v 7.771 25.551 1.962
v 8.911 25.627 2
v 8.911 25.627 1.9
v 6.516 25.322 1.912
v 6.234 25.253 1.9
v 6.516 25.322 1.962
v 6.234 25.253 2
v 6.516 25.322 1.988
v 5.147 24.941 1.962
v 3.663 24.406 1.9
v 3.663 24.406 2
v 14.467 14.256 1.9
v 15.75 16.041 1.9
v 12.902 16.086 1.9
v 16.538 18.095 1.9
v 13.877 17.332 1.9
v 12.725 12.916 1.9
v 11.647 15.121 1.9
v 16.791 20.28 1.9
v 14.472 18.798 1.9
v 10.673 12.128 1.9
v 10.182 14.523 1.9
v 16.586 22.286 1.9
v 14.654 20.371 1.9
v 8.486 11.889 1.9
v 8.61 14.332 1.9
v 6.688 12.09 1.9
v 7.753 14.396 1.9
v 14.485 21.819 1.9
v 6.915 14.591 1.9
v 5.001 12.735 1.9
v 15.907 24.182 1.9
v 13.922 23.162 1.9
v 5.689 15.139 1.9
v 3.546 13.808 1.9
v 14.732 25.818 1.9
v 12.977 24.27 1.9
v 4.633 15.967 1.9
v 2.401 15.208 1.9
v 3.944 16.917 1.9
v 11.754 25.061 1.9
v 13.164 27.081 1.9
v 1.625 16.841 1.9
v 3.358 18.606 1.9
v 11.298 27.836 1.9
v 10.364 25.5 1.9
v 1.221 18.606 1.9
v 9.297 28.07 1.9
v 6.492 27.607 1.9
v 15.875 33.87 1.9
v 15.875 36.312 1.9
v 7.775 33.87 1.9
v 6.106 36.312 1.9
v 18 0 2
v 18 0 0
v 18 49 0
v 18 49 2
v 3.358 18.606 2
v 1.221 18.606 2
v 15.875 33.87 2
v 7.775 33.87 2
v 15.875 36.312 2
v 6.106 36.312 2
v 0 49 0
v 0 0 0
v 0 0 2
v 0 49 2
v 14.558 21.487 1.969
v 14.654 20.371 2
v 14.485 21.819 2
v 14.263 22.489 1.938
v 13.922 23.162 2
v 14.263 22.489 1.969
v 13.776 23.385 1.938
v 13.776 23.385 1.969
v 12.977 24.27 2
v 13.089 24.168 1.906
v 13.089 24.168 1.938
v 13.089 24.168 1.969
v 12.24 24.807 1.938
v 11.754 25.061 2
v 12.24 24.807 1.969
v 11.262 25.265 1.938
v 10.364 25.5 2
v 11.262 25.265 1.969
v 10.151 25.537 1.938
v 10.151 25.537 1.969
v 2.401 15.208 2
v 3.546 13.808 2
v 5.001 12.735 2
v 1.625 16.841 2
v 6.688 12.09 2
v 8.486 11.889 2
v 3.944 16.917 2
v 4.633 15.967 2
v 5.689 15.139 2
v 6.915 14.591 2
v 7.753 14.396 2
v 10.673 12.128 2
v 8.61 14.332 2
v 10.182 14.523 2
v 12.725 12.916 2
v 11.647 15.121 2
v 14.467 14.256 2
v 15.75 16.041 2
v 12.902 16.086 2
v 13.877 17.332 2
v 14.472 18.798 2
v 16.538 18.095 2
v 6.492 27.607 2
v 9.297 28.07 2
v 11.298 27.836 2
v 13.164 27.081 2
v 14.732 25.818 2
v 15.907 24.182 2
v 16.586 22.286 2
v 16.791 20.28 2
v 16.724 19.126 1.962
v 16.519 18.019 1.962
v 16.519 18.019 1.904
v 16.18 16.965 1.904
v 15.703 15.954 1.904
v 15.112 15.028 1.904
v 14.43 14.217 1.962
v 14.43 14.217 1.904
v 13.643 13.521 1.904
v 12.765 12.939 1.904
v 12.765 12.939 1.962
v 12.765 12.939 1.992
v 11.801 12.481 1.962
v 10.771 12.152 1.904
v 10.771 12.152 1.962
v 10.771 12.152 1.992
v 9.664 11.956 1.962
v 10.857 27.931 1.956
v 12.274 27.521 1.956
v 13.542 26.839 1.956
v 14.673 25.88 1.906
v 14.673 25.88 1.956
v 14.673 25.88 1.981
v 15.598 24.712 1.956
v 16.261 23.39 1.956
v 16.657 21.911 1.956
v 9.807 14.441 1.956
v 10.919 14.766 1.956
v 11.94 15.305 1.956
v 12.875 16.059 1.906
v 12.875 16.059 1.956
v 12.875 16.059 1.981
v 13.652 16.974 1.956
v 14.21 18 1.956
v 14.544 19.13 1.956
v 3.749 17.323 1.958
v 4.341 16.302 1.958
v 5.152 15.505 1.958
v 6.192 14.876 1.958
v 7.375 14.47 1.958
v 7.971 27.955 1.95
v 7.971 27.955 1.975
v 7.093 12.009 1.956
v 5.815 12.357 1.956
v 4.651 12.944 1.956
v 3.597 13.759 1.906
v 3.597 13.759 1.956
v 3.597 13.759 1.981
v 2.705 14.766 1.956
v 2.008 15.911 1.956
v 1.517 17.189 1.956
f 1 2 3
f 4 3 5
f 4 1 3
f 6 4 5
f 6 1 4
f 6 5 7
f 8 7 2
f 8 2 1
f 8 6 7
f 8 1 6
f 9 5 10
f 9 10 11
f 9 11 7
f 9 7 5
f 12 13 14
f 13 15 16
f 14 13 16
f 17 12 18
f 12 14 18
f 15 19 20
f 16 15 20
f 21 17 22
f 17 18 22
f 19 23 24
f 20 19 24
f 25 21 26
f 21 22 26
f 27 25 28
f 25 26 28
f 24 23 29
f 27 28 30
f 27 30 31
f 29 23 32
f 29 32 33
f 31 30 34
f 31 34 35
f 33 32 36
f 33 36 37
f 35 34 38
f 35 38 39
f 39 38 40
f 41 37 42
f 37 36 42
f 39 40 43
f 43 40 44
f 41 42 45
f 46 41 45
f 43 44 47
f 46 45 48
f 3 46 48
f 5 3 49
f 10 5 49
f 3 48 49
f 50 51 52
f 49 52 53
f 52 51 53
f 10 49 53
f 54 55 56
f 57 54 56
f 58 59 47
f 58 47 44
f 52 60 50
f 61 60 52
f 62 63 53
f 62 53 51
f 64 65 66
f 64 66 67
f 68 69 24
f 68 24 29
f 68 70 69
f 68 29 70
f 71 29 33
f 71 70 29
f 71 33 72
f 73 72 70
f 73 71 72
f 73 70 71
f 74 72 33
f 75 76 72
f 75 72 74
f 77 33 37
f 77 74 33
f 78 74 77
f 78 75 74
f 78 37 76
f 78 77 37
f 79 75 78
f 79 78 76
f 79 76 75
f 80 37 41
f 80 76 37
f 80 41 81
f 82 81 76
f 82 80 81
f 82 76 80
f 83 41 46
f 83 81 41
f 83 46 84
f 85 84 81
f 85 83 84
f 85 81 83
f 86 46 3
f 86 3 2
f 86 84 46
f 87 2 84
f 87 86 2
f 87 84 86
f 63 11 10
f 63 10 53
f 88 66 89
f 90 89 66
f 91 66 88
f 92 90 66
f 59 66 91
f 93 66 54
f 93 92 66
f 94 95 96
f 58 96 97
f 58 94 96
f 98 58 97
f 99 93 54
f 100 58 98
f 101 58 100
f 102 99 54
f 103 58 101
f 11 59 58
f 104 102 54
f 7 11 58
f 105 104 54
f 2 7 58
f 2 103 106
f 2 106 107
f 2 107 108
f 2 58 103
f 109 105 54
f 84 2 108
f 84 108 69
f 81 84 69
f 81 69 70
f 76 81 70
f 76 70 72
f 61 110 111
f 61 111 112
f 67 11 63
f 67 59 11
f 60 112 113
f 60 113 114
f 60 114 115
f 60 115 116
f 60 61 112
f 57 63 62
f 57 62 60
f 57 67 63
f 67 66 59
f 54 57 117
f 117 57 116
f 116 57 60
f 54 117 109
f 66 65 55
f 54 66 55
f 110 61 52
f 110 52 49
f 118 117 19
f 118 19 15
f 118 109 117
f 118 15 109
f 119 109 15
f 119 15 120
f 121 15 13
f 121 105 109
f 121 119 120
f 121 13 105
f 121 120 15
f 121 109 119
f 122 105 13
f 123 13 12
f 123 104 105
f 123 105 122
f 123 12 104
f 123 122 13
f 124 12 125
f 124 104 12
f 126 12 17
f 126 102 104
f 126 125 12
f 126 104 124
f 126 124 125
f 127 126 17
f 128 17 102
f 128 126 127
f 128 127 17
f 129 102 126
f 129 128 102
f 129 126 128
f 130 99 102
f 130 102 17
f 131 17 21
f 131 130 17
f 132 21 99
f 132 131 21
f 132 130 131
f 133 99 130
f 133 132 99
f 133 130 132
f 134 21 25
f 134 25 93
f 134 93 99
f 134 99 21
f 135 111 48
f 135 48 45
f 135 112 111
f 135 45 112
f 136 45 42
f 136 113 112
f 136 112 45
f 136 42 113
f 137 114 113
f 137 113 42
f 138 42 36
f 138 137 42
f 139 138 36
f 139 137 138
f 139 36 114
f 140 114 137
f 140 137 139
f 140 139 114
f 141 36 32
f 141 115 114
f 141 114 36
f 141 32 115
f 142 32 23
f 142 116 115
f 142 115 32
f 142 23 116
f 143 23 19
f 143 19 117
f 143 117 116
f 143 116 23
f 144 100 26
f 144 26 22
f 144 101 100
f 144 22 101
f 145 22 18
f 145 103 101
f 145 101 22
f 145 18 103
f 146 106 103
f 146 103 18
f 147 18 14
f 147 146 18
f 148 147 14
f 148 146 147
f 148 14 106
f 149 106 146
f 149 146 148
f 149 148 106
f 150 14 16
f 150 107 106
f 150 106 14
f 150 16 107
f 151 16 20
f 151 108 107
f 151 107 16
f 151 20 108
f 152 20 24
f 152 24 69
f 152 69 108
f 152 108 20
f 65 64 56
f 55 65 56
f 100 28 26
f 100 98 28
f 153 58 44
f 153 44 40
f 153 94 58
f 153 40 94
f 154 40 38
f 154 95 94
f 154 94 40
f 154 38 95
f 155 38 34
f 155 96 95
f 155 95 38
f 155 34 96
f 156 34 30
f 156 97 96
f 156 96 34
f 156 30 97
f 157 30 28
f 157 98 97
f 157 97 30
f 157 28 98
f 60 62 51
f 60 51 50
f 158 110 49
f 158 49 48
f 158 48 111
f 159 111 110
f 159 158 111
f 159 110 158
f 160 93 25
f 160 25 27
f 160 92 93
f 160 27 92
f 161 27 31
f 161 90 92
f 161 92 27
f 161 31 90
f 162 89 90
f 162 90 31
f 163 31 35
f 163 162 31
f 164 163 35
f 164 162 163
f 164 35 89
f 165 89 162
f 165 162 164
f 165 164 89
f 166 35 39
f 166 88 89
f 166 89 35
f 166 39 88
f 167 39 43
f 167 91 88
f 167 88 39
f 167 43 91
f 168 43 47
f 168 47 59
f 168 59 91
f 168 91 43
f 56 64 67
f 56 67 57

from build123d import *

# Parameters (mm, degrees)
SKETCH_1_W          = 18
SKETCH_1_H          = 49
EXTRUDE_1_DEPTH     = 2
CUT_EXTRUDE_1_DEPTH = 0.1


with BuildPart() as part:
    # ｽｹｯﾁ1 → ﾎﾞｽ - 押し出し1 (new body)
    with BuildSketch(Plane.XY):
        with Locations((9, 24.5)):
            Rectangle(SKETCH_1_W, SKETCH_1_H)
    extrude(amount=EXTRUDE_1_DEPTH)

    # ｽｹｯﾁ2 → ｶｯﾄ - 押し出し1 (cut)
    with BuildSketch(Plane.XY.offset(2)):
        with BuildLine():
            Line((15.875, 36.3125), (15.875, 33.870192308))
            Line((15.875, 33.870192308), (7.775315505, 33.870192308))
            Line((7.775315505, 33.870192308), (6.49214994, 27.607008714))
            add(Edge.make_bspline(
                [(6.49214994, 27.607008714), (6.744262228, 27.676611099), (7.232689912, 27.811454712), (7.953595395, 27.961172542), (8.637981636, 28.051424939), (9.082087281, 28.063748319), (9.29698768, 28.069711538)],
                knots=[0, 0, 0, 0, 1.100273476, 2.13160584, 3.095893838, 4, 4, 4, 4], degree=3))
            add(Edge.make_bspline(
                [(9.29698768, 28.069711538), (9.562896695, 28.063956155), (10.085740255, 28.052639632), (10.850726663, 27.943974013), (11.580973668, 27.772932808), (12.27495408, 27.53398783), (12.933951755, 27.228441252), (13.551903557, 26.846761301), (14.138085072, 26.400900602), (14.68198022, 25.888285431), (15.175404531, 25.324122288), (15.609240996, 24.717530344), (15.977740048, 24.074404643), (16.274108756, 23.388600502), (16.510766458, 22.667699833), (16.668282709, 21.904117441), (16.77317139, 21.105050767), (16.784889768, 20.558692889), (16.790865385, 20.280085637)],
                knots=[0, 0, 0, 0, 1.052922333, 2.070308379, 3.05430497, 4.020497103, 4.973039431, 5.925935799, 6.892292201, 7.88610001, 8.88166317, 9.857072816, 10.836096531, 11.812156883, 12.81219415, 13.836441305, 14.89672472, 16, 16, 16, 16], degree=3))
            add(Edge.make_bspline(
                [(16.790865385, 20.280085637), (16.786340497, 20.086032674), (16.777351873, 19.700549205), (16.731641482, 19.128068125), (16.643632414, 18.567706707), (16.525469862, 18.019390612), (16.372100912, 17.48415792), (16.186437884, 16.960476631), (15.959225626, 16.451606182), (15.710001448, 15.952731619), (15.429378088, 15.475131061), (15.117920743, 15.028483492), (14.788862669, 14.606088649), (14.434795386, 14.212476644), (14.052427901, 13.850233968), (13.646390984, 13.517210839), (13.219924628, 13.20777536), (12.766430926, 12.934488174), (12.296015104, 12.683008062), (11.801883841, 12.47669971), (11.295285147, 12.292251296), (10.76892769, 12.145229331), (10.224003714, 12.030027487), (9.659614974, 11.951782329), (9.078721487, 11.894792638), (8.684964705, 11.891225138), (8.486065204, 11.889423077)],
                knots=[0, 0, 0, 0, 1.056347294, 2.098418968, 3.122841568, 4.141288669, 5.149314143, 6.15115421, 7.162517403, 8.180376062, 9.185164535, 10.17417709, 11.141909838, 12.097768115, 13.052685741, 14.0056014, 14.954263652, 15.917497458, 16.885230207, 17.854509472, 18.828990115, 19.81800267, 20.826176721, 21.857883937, 22.917946725, 24, 24, 24, 24], degree=3))
            add(Edge.make_bspline(
                [(8.486065204, 11.889423077), (8.248796225, 11.894123242), (7.781997537, 11.903370263), (7.098098679, 12.000106743), (6.440093951, 12.138654103), (5.813280227, 12.347090153), (5.212040023, 12.608260854), (4.644467603, 12.938344093), (4.096060448, 13.312398352), (3.589112484, 13.753816468), (3.118603926, 14.236296376), (2.697418571, 14.759883184), (2.322313344, 15.315935282), (1.999295101, 15.90715308), (1.72376392, 16.531983085), (1.507308375, 17.192766359), (1.332603853, 17.886050314), (1.258693796, 18.363344733), (1.221153846, 18.605769231)],
                knots=[0, 0, 0, 0, 1.0467383, 2.05933395, 3.04377827, 4.011590433, 4.970194871, 5.932262533, 6.905835911, 7.896367577, 8.894135286, 9.877477877, 10.858688626, 11.851381753, 12.8477658, 13.868841284, 14.917554742, 16, 16, 16, 16], degree=3))
            Line((1.221153846, 18.605769231), (3.358173077, 18.605769231))
            add(Edge.make_bspline(
                [(3.358173077, 18.605769231), (3.410754869, 18.378690153), (3.511819994, 17.942231555), (3.733655534, 17.329016537), (4.004885865, 16.782558961), (4.327404736, 16.295630189), (4.712146908, 15.871026119), (5.151177487, 15.492631465), (5.643400389, 15.151261389), (6.190361469, 14.866717205), (6.767393312, 14.624042293), (7.371327366, 14.46244594), (7.985719437, 14.348820223), (8.401270492, 14.337446279), (8.610088642, 14.331730769)],
                knots=[0, 0, 0, 0, 1.136247022, 2.183929868, 3.172523383, 4.106158343, 5.02341133, 5.958108904, 6.928429099, 7.938127109, 8.96079061, 9.975095812, 10.982467395, 12, 12, 12, 12], degree=3))
            add(Edge.make_bspline(
                [(8.610088642, 14.331730769), (8.813913058, 14.33731499), (9.215245002, 14.348310367), (9.805872472, 14.432940075), (10.376099349, 14.563279979), (10.920299044, 14.758337386), (11.447994518, 14.995405916), (11.945837492, 15.299628129), (12.428230281, 15.64974004), (12.880178833, 16.050855684), (13.294104371, 16.492881642), (13.659837981, 16.96557605), (13.96448091, 17.46983531), (14.221207615, 17.996929439), (14.41615238, 18.552635337), (14.555224056, 19.13434869), (14.636887724, 19.743506323), (14.648121645, 20.158995734), (14.653846154, 20.370718149)],
                knots=[0, 0, 0, 0, 1.027316725, 2.022795036, 3.002884548, 3.971462791, 4.93288096, 5.914575861, 6.907176829, 7.935150275, 8.956128384, 9.956726525, 10.942570165, 11.921478529, 12.907843606, 13.90538589, 14.932640048, 16, 16, 16, 16], degree=3))
            add(Edge.make_bspline(
                [(14.653846154, 20.370718149), (14.649366142, 20.561733531), (14.640597156, 20.935618961), (14.568951668, 21.482620705), (14.444330839, 22.000189082), (14.271357655, 22.490823424), (14.051741719, 22.954986487), (13.783365915, 23.393157308), (13.46119369, 23.799560709), (13.093175662, 24.174386832), (12.690009348, 24.52031357), (12.244758171, 24.815208159), (11.76673974, 25.063293027), (11.261713358, 25.277387801), (10.717666459, 25.431153587), (10.145372942, 25.546595808), (9.53865284, 25.613375329), (9.123834408, 25.622641033), (8.910606971, 25.627403846)],
                knots=[0, 0, 0, 0, 1.045622112, 2.046656509, 3.013763289, 3.955457236, 4.890082067, 5.820317437, 6.762574623, 7.722996705, 8.69280354, 9.665887285, 10.63943826, 11.638615906, 12.663482002, 13.728887084, 14.832589034, 16, 16, 16, 16], degree=3))
            add(Edge.make_bspline(
                [(8.910606971, 25.627403846), (8.726033366, 25.623453753), (8.344935699, 25.615297812), (7.76035361, 25.55524611), (7.146047423, 25.458368054), (6.504372016, 25.32511162), (5.833400345, 25.150728758), (5.134548368, 24.94176046), (4.406346697, 24.691919718), (3.915688608, 24.503241621), (3.663461538, 24.40625)],
                knots=[0, 0, 0, 0, 0.817624296, 1.688186739, 2.600797293, 3.572016777, 4.590301741, 5.671205678, 6.80286297, 8, 8, 8, 8], degree=3))
            Line((3.663461538, 24.40625), (6.105769231, 36.3125))
            Line((6.105769231, 36.3125), (15.875, 36.3125))
        make_face()
    extrude(amount=-CUT_EXTRUDE_1_DEPTH, mode=Mode.SUBTRACT)


solid = part.part
